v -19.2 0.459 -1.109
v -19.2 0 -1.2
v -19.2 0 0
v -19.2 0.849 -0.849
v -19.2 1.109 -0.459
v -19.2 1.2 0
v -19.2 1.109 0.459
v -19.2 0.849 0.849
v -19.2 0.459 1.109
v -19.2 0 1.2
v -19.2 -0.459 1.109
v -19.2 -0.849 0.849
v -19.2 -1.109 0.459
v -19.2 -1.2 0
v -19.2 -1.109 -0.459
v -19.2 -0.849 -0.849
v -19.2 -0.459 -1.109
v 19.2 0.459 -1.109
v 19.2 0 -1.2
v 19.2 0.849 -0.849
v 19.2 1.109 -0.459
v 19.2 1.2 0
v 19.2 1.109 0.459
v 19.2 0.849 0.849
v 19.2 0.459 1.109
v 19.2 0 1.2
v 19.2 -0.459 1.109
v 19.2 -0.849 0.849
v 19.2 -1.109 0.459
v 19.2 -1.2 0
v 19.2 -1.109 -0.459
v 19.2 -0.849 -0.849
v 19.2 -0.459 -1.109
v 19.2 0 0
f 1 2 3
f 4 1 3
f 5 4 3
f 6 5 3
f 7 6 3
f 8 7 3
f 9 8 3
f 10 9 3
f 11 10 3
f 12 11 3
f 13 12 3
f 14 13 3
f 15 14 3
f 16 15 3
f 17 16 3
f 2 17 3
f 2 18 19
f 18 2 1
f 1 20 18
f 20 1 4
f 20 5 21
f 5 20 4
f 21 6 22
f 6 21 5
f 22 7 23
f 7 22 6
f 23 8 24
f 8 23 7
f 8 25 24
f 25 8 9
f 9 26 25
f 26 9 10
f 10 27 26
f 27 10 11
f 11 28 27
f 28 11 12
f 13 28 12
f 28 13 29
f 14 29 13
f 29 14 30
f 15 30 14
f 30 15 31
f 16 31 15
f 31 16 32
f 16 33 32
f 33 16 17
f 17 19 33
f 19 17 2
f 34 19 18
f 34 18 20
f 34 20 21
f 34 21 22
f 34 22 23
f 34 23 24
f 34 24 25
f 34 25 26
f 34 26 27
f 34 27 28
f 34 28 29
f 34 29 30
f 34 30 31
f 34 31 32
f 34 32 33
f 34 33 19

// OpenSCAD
// file: ../p/stud3.scad
use <../lib.scad>
use <4-4cyli.scad>
use <4-4disc.scad>
use <4-4edge.scad>
$fa=1; $fs=0.2;
function ldraw_lib__stud3(realsolid=false) = realsolid ? 
    [openscad(translate([0,0,-eps()], o=cylinder(4+eps(), r=4)),2)] : [
// 0 Stud Tube Solid
// 0 Name: stud3.dat
// 0 Author: James Jessiman
// 0 !LDRAW_ORG Primitive UPDATE 2012-01
// 0 !LICENSE Licensed under CC BY 2.0 and CC BY 4.0 : see CAreadme.txt
// 
// 0 BFC CERTIFY CCW
  [0,"BFC","CERTIFY"],
  [0,"BFC","CCW"],
// 
// 0 !HISTORY 2002-04-04 [sbliss] Modified for BFC compliance
// 0 !HISTORY 2002-04-25 [PTadmin] Official Update 2002-02
// 0 !HISTORY 2007-06-24 [PTadmin] Header formatted for Contributor Agreement
// 0 !HISTORY 2008-07-01 [PTadmin] Official Update 2008-01
// 0 !HISTORY 2012-02-16 [Philo] Changed to CCW
// 0 !HISTORY 2012-03-30 [PTadmin] Official Update 2012-01
// 
// 
// 1 16 0 -4 0 4 0 0 0 1 0 0 0 4 4-4edge.dat
  [1,16,0,-4,0,4,0,0,0,1,0,0,0,4, ldraw_lib__4_4edge(realsolid)],
// 1 16 0 0 0 4 0 0 0 1 0 0 0 4 4-4edge.dat
  [1,16,0,0,0,4,0,0,0,1,0,0,0,4, ldraw_lib__4_4edge(realsolid)],
// 1 16 0 -4 0 4 0 0 0 1 0 0 0 4 4-4disc.dat
  [1,16,0,-4,0,4,0,0,0,1,0,0,0,4, ldraw_lib__4_4disc(realsolid)],
// 1 16 0 -4 0 4 0 0 0 4 0 0 0 4 4-4cyli.dat
  [1,16,0,-4,0,4,0,0,0,4,0,0,0,4, ldraw_lib__4_4cyli(realsolid)],
];
module ldraw_lib__stud3(step=0, col=false, unit=2/5, alt=false, line=0.2, solid=!$preview)
    makepoly(ldraw_lib__stud3(solid), step=step, col=col, unit=unit, alt=alt, line=line, solid=solid);
ldraw_lib__stud3(line=0.2);
// file: ../p/stud.scad
use <../lib.scad>
use <4-4cyli.scad>
use <4-4disc.scad>
use <4-4edge.scad>
$fa=1; $fs=0.2;
function ldraw_lib__stud(realsolid=false) = realsolid ? 
    [openscad(translate([0,0,-eps()], o=cylinder(4+eps(), r=6)),2)] : [
// 0 Stud
// 0 Name: stud.dat
// 0 Author: James Jessiman
// 0 !LDRAW_ORG Primitive UPDATE 2012-01
// 0 !LICENSE Licensed under CC BY 2.0 and CC BY 4.0 : see CAreadme.txt
// 
// 0 BFC CERTIFY CCW
  [0,"BFC","CERTIFY"],
  [0,"BFC","CCW"],
// 
// 0 !HISTORY 2002-04-04 [sbliss] Modified for BFC compliance
// 0 !HISTORY 2002-04-25 [PTadmin] Official Update 2002-02
// 0 !HISTORY 2007-06-24 [PTadmin] Header formatted for Contributor Agreement
// 0 !HISTORY 2008-07-01 [PTadmin] Official Update 2008-01
// 0 !HISTORY 2012-02-16 [Philo] Changed to CCW
// 0 !HISTORY 2012-03-30 [PTadmin] Official Update 2012-01
// 
// 
// 1 16 0 0 0 6 0 0 0 1 0 0 0 6 4-4edge.dat
  [1,16,0,0,0,6,0,0,0,1,0,0,0,6, ldraw_lib__4_4edge(realsolid)],
// 1 16 0 -4 0 6 0 0 0 1 0 0 0 6 4-4edge.dat
  [1,16,0,-4,0,6,0,0,0,1,0,0,0,6, ldraw_lib__4_4edge(realsolid)],
// 1 16 0 0 0 6 0 0 0 -4 0 0 0 6 4-4cyli.dat
  [1,16,0,0,0,6,0,0,0,-4,0,0,0,6, ldraw_lib__4_4cyli(realsolid)],
// 1 16 0 -4 0 6 0 0 0 1 0 0 0 6 4-4disc.dat
  [1,16,0,-4,0,6,0,0,0,1,0,0,0,6, ldraw_lib__4_4disc(realsolid)],
];
module ldraw_lib__stud(step=0, col=false, unit=2/5, alt=false, line=0.2, solid=!$preview)
    makepoly(ldraw_lib__stud(solid), step=step, col=col, unit=unit, alt=alt, line=line, solid=solid);
ldraw_lib__stud(line=0.2);
// file: ../p/box5.scad
use <../lib.scad>
$fa=1; $fs=0.2;
function ldraw_lib__box5(realsolid=false) = [
// 0 Box with 5 Faces and All Edges
// 0 Name: box5.dat
// 0 Author: James Jessiman
// 0 !LDRAW_ORG Primitive UPDATE 2012-01
// 0 !LICENSE Licensed under CC BY 2.0 and CC BY 4.0 : see CAreadme.txt
// 
// 0 BFC CERTIFY CCW
  [0,"BFC","CERTIFY"],
  [0,"BFC","CCW"],
// 
// 0 !HISTORY 2002-04-03 [sbliss] Modified for BFC compliance
// 0 !HISTORY 2002-04-25 [PTadmin] Official Update 2002-02
// 0 !HISTORY 2007-06-24 [PTadmin] Header formatted for Contributor Agreement
// 0 !HISTORY 2008-07-01 [PTadmin] Official Update 2008-01
// 0 !HISTORY 2012-02-16 [Philo] Changed to CCW
// 0 !HISTORY 2012-03-30 [PTadmin] Official Update 2012-01
// 
// 
// 2 24 1 1 1 -1 1 1
  [2,24,1,1,1,-1,1,1],
// 2 24 -1 1 1 -1 1 -1
  [2,24,-1,1,1,-1,1,-1],
// 2 24 -1 1 -1 1 1 -1
  [2,24,-1,1,-1,1,1,-1],
// 2 24 1 1 -1 1 1 1
  [2,24,1,1,-1,1,1,1],
// 2 24 1 0 1 -1 0 1
  [2,24,1,0,1,-1,0,1],
// 2 24 -1 0 1 -1 0 -1
  [2,24,-1,0,1,-1,0,-1],
// 2 24 -1 0 -1 1 0 -1
  [2,24,-1,0,-1,1,0,-1],
// 2 24 1 0 -1 1 0 1
  [2,24,1,0,-1,1,0,1],
// 2 24 1 0 1 1 1 1
  [2,24,1,0,1,1,1,1],
// 2 24 -1 0 1 -1 1 1
  [2,24,-1,0,1,-1,1,1],
// 2 24 1 0 -1 1 1 -1
  [2,24,1,0,-1,1,1,-1],
// 2 24 -1 0 -1 -1 1 -1
  [2,24,-1,0,-1,-1,1,-1],
// 4 16 -1 1 1 1 1 1 1 1 -1 -1 1 -1
  [4,16,-1,1,1,1,1,1,1,1,-1,-1,1,-1],
// 4 16 -1 1 1 -1 0 1 1 0 1 1 1 1
  [4,16,-1,1,1,-1,0,1,1,0,1,1,1,1],
// 4 16 -1 1 -1 -1 0 -1 -1 0 1 -1 1 1
  [4,16,-1,1,-1,-1,0,-1,-1,0,1,-1,1,1],
// 4 16 1 1 -1 1 0 -1 -1 0 -1 -1 1 -1
  [4,16,1,1,-1,1,0,-1,-1,0,-1,-1,1,-1],
// 4 16 1 1 1 1 0 1 1 0 -1 1 1 -1
  [4,16,1,1,1,1,0,1,1,0,-1,1,1,-1],
];
module ldraw_lib__box5(step=0, col=false, unit=2/5, alt=false, line=0.2, solid=!$preview)
    makepoly(ldraw_lib__box5(solid), step=step, col=col, unit=unit, alt=alt, line=line, solid=solid);
ldraw_lib__box5(line=0.2);
// file: ../p/box4t.scad
use <../lib.scad>
$fa=1; $fs=0.2;
function ldraw_lib__box4t(realsolid=false) = [
// 0 Box with 4 Adjacent Faces and All Edges
// 0 Name: box4t.dat
// 0 Author: Tore Eriksson [Tore_Eriksson]
// 0 !LDRAW_ORG Primitive UPDATE 2003-02
// 0 !LICENSE Licensed under CC BY 2.0 and CC BY 4.0 : see CAreadme.txt
// 
// 0 BFC CERTIFY CCW
  [0,"BFC","CERTIFY"],
  [0,"BFC","CCW"],
// 
// 0 !HISTORY 1997-09-29 [PTadmin] Official Update 1997-15
// 0 !HISTORY 2002-08-31 [izanette] Modified with WINDZ for BFC compliance
// 0 !HISTORY 2003-08-01 [PTadmin] Official Update 2003-02
// 0 !HISTORY 2007-06-24 [PTadmin] Header formatted for Contributor Agreement
// 0 !HISTORY 2008-07-01 [PTadmin] Official Update 2008-01
// 
// 
// 2 24 1 1 1 -1 1 1
  [2,24,1,1,1,-1,1,1],
// 2 24 -1 1 1 -1 1 -1
  [2,24,-1,1,1,-1,1,-1],
// 2 24 -1 1 -1 1 1 -1
  [2,24,-1,1,-1,1,1,-1],
// 2 24 1 1 -1 1 1 1
  [2,24,1,1,-1,1,1,1],
// 2 24 1 0 1 -1 0 1
  [2,24,1,0,1,-1,0,1],
// 2 24 -1 0 1 -1 0 -1
  [2,24,-1,0,1,-1,0,-1],
// 2 24 -1 0 -1 1 0 -1
  [2,24,-1,0,-1,1,0,-1],
// 2 24 1 0 -1 1 0 1
  [2,24,1,0,-1,1,0,1],
// 2 24 1 0 1 1 1 1
  [2,24,1,0,1,1,1,1],
// 2 24 -1 0 1 -1 1 1
  [2,24,-1,0,1,-1,1,1],
// 2 24 1 0 -1 1 1 -1
  [2,24,1,0,-1,1,1,-1],
// 2 24 -1 0 -1 -1 1 -1
  [2,24,-1,0,-1,-1,1,-1],
// 4 16 1 1 1 1 1 -1 -1 1 -1 -1 1 1
  [4,16,1,1,1,1,1,-1,-1,1,-1,-1,1,1],
// 4 16 1 1 1 -1 1 1 -1 0 1 1 0 1
  [4,16,1,1,1,-1,1,1,-1,0,1,1,0,1],
// 4 16 -1 1 1 -1 1 -1 -1 0 -1 -1 0 1
  [4,16,-1,1,1,-1,1,-1,-1,0,-1,-1,0,1],
// 0 4 16 -1 1 -1 -1 0 -1 1 0 -1 1 1 -1
// 4 16 1 1 -1 1 1 1 1 0 1 1 0 -1
  [4,16,1,1,-1,1,1,1,1,0,1,1,0,-1],
// 0
];
module ldraw_lib__box4t(step=0, col=false, unit=2/5, alt=false, line=0.2, solid=!$preview)
    makepoly(ldraw_lib__box4t(solid), step=step, col=col, unit=unit, alt=alt, line=line, solid=solid);
ldraw_lib__box4t(line=0.2);
// file: s/3004s01.scad
use <../../lib.scad>
use <../../p/box4t.scad>
use <../../p/box5.scad>
use <../../p/stud.scad>
use <../../p/stud3.scad>
$fa=1; $fs=0.2;
function ldraw_lib__s__3004s01(realsolid=false) = [
// 0 ~Brick  1 x  2 without Front Face
// 0 Name: s\3004s01.dat
// 0 Author: James Jessiman
// 0 !LDRAW_ORG Subpart UPDATE 2003-03
// 0 !LICENSE Licensed under CC BY 2.0 and CC BY 4.0 : see CAreadme.txt
// 
// 0 BFC CERTIFY CCW
  [0,"BFC","CERTIFY"],
  [0,"BFC","CCW"],
// 
// 0 !HISTORY 2003-09-07 [jriley] Subfiling, BFC
// 0 !HISTORY 2003-12-19 [PTadmin] Official Update 2003-03
// 0 !HISTORY 2007-08-29 [PTadmin] Header formatted for Contributor Agreement
// 0 !HISTORY 2008-07-01 [PTadmin] Official Update 2008-01
// 
// 
// 1 16 0 4 0 1 0 0 0 -5 0 0 0 1 stud3.dat
  [1,16,0,4,0,1,0,0,0,-5,0,0,0,1, ldraw_lib__stud3(realsolid)],
// 0 BFC INVERTNEXT
  [0,"BFC","INVERTNEXT"],
// 1 16 0 24 0 16 0 0 0 -20 0 0 0 6 box5.dat
  [1,16,0,24,0,16,0,0,0,-20,0,0,0,6, ldraw_lib__box5(realsolid)],
// 4 16 20 24 10 16 24 6 -16 24 6 -20 24 10
  [4,16,20,24,10,16,24,6,-16,24,6,-20,24,10],
// 4 16 -20 24 10 -16 24 6 -16 24 -6 -20 24 -10
  [4,16,-20,24,10,-16,24,6,-16,24,-6,-20,24,-10],
// 4 16 -20 24 -10 -16 24 -6 16 24 -6 20 24 -10
  [4,16,-20,24,-10,-16,24,-6,16,24,-6,20,24,-10],
// 4 16 20 24 -10 16 24 -6 16 24 6 20 24 10
  [4,16,20,24,-10,16,24,-6,16,24,6,20,24,10],
// 1 16 0 24 0 20 0 0 0 -24 0 0 0 10 box4t.dat
  [1,16,0,24,0,20,0,0,0,-24,0,0,0,10, ldraw_lib__box4t(realsolid)],
// 1 16 10 0 0 1 0 0 0 1 0 0 0 1 stud.dat
  [1,16,10,0,0,1,0,0,0,1,0,0,0,1, ldraw_lib__stud(realsolid)],
// 1 16 -10 0 0 1 0 0 0 1 0 0 0 1 stud.dat
  [1,16,-10,0,0,1,0,0,0,1,0,0,0,1, ldraw_lib__stud(realsolid)],
// 0
];
module ldraw_lib__s__3004s01(step=0, col=false, unit=2/5, alt=false, line=0.2, solid=!$preview)
    makepoly(ldraw_lib__s__3004s01(solid), step=step, col=col, unit=unit, alt=alt, line=line, solid=solid);
ldraw_lib__s__3004s01(line=0.2);
// file: ../p/4-4edge.scad
use <../lib.scad>
$fa=1; $fs=0.2;
function ldraw_lib__4_4edge(realsolid=false) = [
// 0 Circle 1.0
// 0 Name: 4-4edge.dat
// 0 Author: James Jessiman
// 0 !LDRAW_ORG Primitive UPDATE 2017-01
// 0 !LICENSE Licensed under CC BY 2.0 and CC BY 4.0 : see CAreadme.txt
// 
// 0 BFC CERTIFY CCW
  [0,"BFC","CERTIFY"],
  [0,"BFC","CCW"],
// 
// 0 !HISTORY 1998-12-15 [PTadmin] Official Update 1998-10
// 0 !HISTORY 2005-12-28 [PTadmin] Official Update 2005-01
// 0 !HISTORY 2007-06-24 [PTadmin] Header formatted for Contributor Agreement
// 0 !HISTORY 2008-07-01 [PTadmin] Official Update 2008-01
// 0 !HISTORY 2017-01-15 [Steffen] BFCed
// 0 !HISTORY 2017-12-30 [PTadmin] Official Update 2017-01
// 
// 
// 2 24 1 0 0 0.9239 0 0.3827
  [2,24,1,0,0,0.9239,0,0.3827],
// 2 24 0.9239 0 0.3827 0.7071 0 0.7071
  [2,24,0.9239,0,0.3827,0.7071,0,0.7071],
// 2 24 0.7071 0 0.7071 0.3827 0 0.9239
  [2,24,0.7071,0,0.7071,0.3827,0,0.9239],
// 2 24 0.3827 0 0.9239 0 0 1
  [2,24,0.3827,0,0.9239,0,0,1],
// 2 24 0 0 1 -0.3827 0 0.9239
  [2,24,0,0,1,-0.3827,0,0.9239],
// 2 24 -0.3827 0 0.9239 -0.7071 0 0.7071
  [2,24,-0.3827,0,0.9239,-0.7071,0,0.7071],
// 2 24 -0.7071 0 0.7071 -0.9239 0 0.3827
  [2,24,-0.7071,0,0.7071,-0.9239,0,0.3827],
// 2 24 -0.9239 0 0.3827 -1 0 -0
  [2,24,-0.9239,0,0.3827,-1,0,-0],
// 2 24 -1 0 -0 -0.9239 0 -0.3827
  [2,24,-1,0,-0,-0.9239,0,-0.3827],
// 2 24 -0.9239 0 -0.3827 -0.7071 0 -0.7071
  [2,24,-0.9239,0,-0.3827,-0.7071,0,-0.7071],
// 2 24 -0.7071 0 -0.7071 -0.3827 0 -0.9239
  [2,24,-0.7071,0,-0.7071,-0.3827,0,-0.9239],
// 2 24 -0.3827 0 -0.9239 0 0 -1
  [2,24,-0.3827,0,-0.9239,0,0,-1],
// 2 24 0 0 -1 0.3827 0 -0.9239
  [2,24,0,0,-1,0.3827,0,-0.9239],
// 2 24 0.3827 0 -0.9239 0.7071 0 -0.7071
  [2,24,0.3827,0,-0.9239,0.7071,0,-0.7071],
// 2 24 0.7071 0 -0.7071 0.9239 0 -0.3827
  [2,24,0.7071,0,-0.7071,0.9239,0,-0.3827],
// 2 24 0.9239 0 -0.3827 1 0 0
  [2,24,0.9239,0,-0.3827,1,0,0],
];
module ldraw_lib__4_4edge(step=0, col=false, unit=2/5, alt=false, line=0.2, solid=!$preview)
    makepoly(ldraw_lib__4_4edge(solid), step=step, col=col, unit=unit, alt=alt, line=line, solid=solid);
ldraw_lib__4_4edge(line=0.2);
// file: ../p/4-4cyli.scad
use <../lib.scad>
$fa=1; $fs=0.2;
function ldraw_lib__4_4cyli(realsolid=false) = [
// 0 Cylinder 1.0
// 0 Name: 4-4cyli.dat
// 0 Author: James Jessiman
// 0 !LDRAW_ORG Primitive UPDATE 2005-01
// 0 !LICENSE Licensed under CC BY 2.0 and CC BY 4.0 : see CAreadme.txt
// 
// 0 BFC CERTIFY CCW
  [0,"BFC","CERTIFY"],
  [0,"BFC","CCW"],
// 
// 0 !HISTORY 1998-12-15 [PTadmin] Official Update 1998-10
// 0 !HISTORY 2002-03-23 [sbliss] Added BFC statement; merged headers from files in distributions LDraw 0.27 and Complete.
// 0 !HISTORY 2002-04-25 [PTadmin] Official Update 2002-02
// 0 !HISTORY 2004-12-14 [guyvivan] BFC CCW
// 0 !HISTORY 2005-12-28 [PTadmin] Official Update 2005-01
// 0 !HISTORY 2007-06-24 [PTadmin] Header formatted for Contributor Agreement
// 0 !HISTORY 2008-07-01 [PTadmin] Official Update 2008-01
// 
// 
// 4 16 1 1 0 0.9239 1 0.3827 0.9239 0 0.3827 1 0 0
  [4,16,1,1,0,0.9239,1,0.3827,0.9239,0,0.3827,1,0,0],
// 5 24 1 0 0 1 1 0 0.9239 0 0.3827 0.9239 0 -0.3827
  [5,24,1,0,0,1,1,0,0.9239,0,0.3827,0.9239,0,-0.3827],
// 4 16 0.9239 1 0.3827 0.7071 1 0.7071 0.7071 0 0.7071 0.9239 0 0.3827
  [4,16,0.9239,1,0.3827,0.7071,1,0.7071,0.7071,0,0.7071,0.9239,0,0.3827],
// 5 24 0.9239 0 0.3827 0.9239 1 0.3827 0.7071 0 0.7071 1 0 0
  [5,24,0.9239,0,0.3827,0.9239,1,0.3827,0.7071,0,0.7071,1,0,0],
// 4 16 0.7071 1 0.7071 0.3827 1 0.9239 0.3827 0 0.9239 0.7071 0 0.7071
  [4,16,0.7071,1,0.7071,0.3827,1,0.9239,0.3827,0,0.9239,0.7071,0,0.7071],
// 5 24 0.7071 0 0.7071 0.7071 1 0.7071 0.3827 0 0.9239 0.9239 0 0.3827
  [5,24,0.7071,0,0.7071,0.7071,1,0.7071,0.3827,0,0.9239,0.9239,0,0.3827],
// 4 16 0.3827 1 0.9239 0 1 1 0 0 1 0.3827 0 0.9239
  [4,16,0.3827,1,0.9239,0,1,1,0,0,1,0.3827,0,0.9239],
// 5 24 0.3827 0 0.9239 0.3827 1 0.9239 0 0 1 0.7071 0 0.7071
  [5,24,0.3827,0,0.9239,0.3827,1,0.9239,0,0,1,0.7071,0,0.7071],
// 4 16 0 1 1 -0.3827 1 0.9239 -0.3827 0 0.9239 0 0 1
  [4,16,0,1,1,-0.3827,1,0.9239,-0.3827,0,0.9239,0,0,1],
// 5 24 0 0 1 0 1 1 -0.3827 0 0.9239 0.3827 0 0.9239
  [5,24,0,0,1,0,1,1,-0.3827,0,0.9239,0.3827,0,0.9239],
// 4 16 -0.3827 1 0.9239 -0.7071 1 0.7071 -0.7071 0 0.7071 -0.3827 0 0.9239
  [4,16,-0.3827,1,0.9239,-0.7071,1,0.7071,-0.7071,0,0.7071,-0.3827,0,0.9239],
// 5 24 -0.3827 0 0.9239 -0.3827 1 0.9239 -0.7071 0 0.7071 0 0 1
  [5,24,-0.3827,0,0.9239,-0.3827,1,0.9239,-0.7071,0,0.7071,0,0,1],
// 4 16 -0.7071 1 0.7071 -0.9239 1 0.3827 -0.9239 0 0.3827 -0.7071 0 0.7071
  [4,16,-0.7071,1,0.7071,-0.9239,1,0.3827,-0.9239,0,0.3827,-0.7071,0,0.7071],
// 5 24 -0.7071 0 0.7071 -0.7071 1 0.7071 -0.9239 0 0.3827 -0.3827 0 0.9239
  [5,24,-0.7071,0,0.7071,-0.7071,1,0.7071,-0.9239,0,0.3827,-0.3827,0,0.9239],
// 4 16 -0.9239 1 0.3827 -1 1 0 -1 0 0 -0.9239 0 0.3827
  [4,16,-0.9239,1,0.3827,-1,1,0,-1,0,0,-0.9239,0,0.3827],
// 5 24 -0.9239 0 0.3827 -0.9239 1 0.3827 -1 0 0 -0.7071 0 0.7071
  [5,24,-0.9239,0,0.3827,-0.9239,1,0.3827,-1,0,0,-0.7071,0,0.7071],
// 4 16 -1 1 0 -0.9239 1 -0.3827 -0.9239 0 -0.3827 -1 0 0
  [4,16,-1,1,0,-0.9239,1,-0.3827,-0.9239,0,-0.3827,-1,0,0],
// 5 24 -1 0 0 -1 1 0 -0.9239 0 -0.3827 -0.9239 0 0.3827
  [5,24,-1,0,0,-1,1,0,-0.9239,0,-0.3827,-0.9239,0,0.3827],
// 4 16 -0.9239 1 -0.3827 -0.7071 1 -0.7071 -0.7071 0 -0.7071 -0.9239 0 -0.3827
  [4,16,-0.9239,1,-0.3827,-0.7071,1,-0.7071,-0.7071,0,-0.7071,-0.9239,0,-0.3827],
// 5 24 -0.9239 0 -0.3827 -0.9239 1 -0.3827 -0.7071 0 -0.7071 -1 0 0
  [5,24,-0.9239,0,-0.3827,-0.9239,1,-0.3827,-0.7071,0,-0.7071,-1,0,0],
// 4 16 -0.7071 1 -0.7071 -0.3827 1 -0.9239 -0.3827 0 -0.9239 -0.7071 0 -0.7071
  [4,16,-0.7071,1,-0.7071,-0.3827,1,-0.9239,-0.3827,0,-0.9239,-0.7071,0,-0.7071],
// 5 24 -0.7071 0 -0.7071 -0.7071 1 -0.7071 -0.3827 0 -0.9239 -0.9239 0 -0.3827
  [5,24,-0.7071,0,-0.7071,-0.7071,1,-0.7071,-0.3827,0,-0.9239,-0.9239,0,-0.3827],
// 4 16 -0.3827 1 -0.9239 0 1 -1 0 0 -1 -0.3827 0 -0.9239
  [4,16,-0.3827,1,-0.9239,0,1,-1,0,0,-1,-0.3827,0,-0.9239],
// 5 24 -0.3827 0 -0.9239 -0.3827 1 -0.9239 0 0 -1 -0.7071 0 -0.7071
  [5,24,-0.3827,0,-0.9239,-0.3827,1,-0.9239,0,0,-1,-0.7071,0,-0.7071],
// 4 16 0 1 -1 0.3827 1 -0.9239 0.3827 0 -0.9239 0 0 -1
  [4,16,0,1,-1,0.3827,1,-0.9239,0.3827,0,-0.9239,0,0,-1],
// 5 24 0 0 -1 0 1 -1 0.3827 0 -0.9239 -0.3827 0 -0.9239
  [5,24,0,0,-1,0,1,-1,0.3827,0,-0.9239,-0.3827,0,-0.9239],
// 4 16 0.3827 1 -0.9239 0.7071 1 -0.7071 0.7071 0 -0.7071 0.3827 0 -0.9239
  [4,16,0.3827,1,-0.9239,0.7071,1,-0.7071,0.7071,0,-0.7071,0.3827,0,-0.9239],
// 5 24 0.3827 0 -0.9239 0.3827 1 -0.9239 0.7071 0 -0.7071 0 0 -1
  [5,24,0.3827,0,-0.9239,0.3827,1,-0.9239,0.7071,0,-0.7071,0,0,-1],
// 4 16 0.7071 1 -0.7071 0.9239 1 -0.3827 0.9239 0 -0.3827 0.7071 0 -0.7071
  [4,16,0.7071,1,-0.7071,0.9239,1,-0.3827,0.9239,0,-0.3827,0.7071,0,-0.7071],
// 5 24 0.7071 0 -0.7071 0.7071 1 -0.7071 0.9239 0 -0.3827 0.3827 0 -0.9239
  [5,24,0.7071,0,-0.7071,0.7071,1,-0.7071,0.9239,0,-0.3827,0.3827,0,-0.9239],
// 4 16 0.9239 1 -0.3827 1 1 0 1 0 0 0.9239 0 -0.3827
  [4,16,0.9239,1,-0.3827,1,1,0,1,0,0,0.9239,0,-0.3827],
// 5 24 0.9239 0 -0.3827 0.9239 1 -0.3827 1 0 0 0.7071 0 -0.7071
  [5,24,0.9239,0,-0.3827,0.9239,1,-0.3827,1,0,0,0.7071,0,-0.7071],
// 0
];
module ldraw_lib__4_4cyli(step=0, col=false, unit=2/5, alt=false, line=0.2, solid=!$preview)
    makepoly(ldraw_lib__4_4cyli(solid), step=step, col=col, unit=unit, alt=alt, line=line, solid=solid);
ldraw_lib__4_4cyli(line=0.2);
// file: 3004.scad
use <../lib.scad>
use <s/3004s01.scad>
$fa=1; $fs=0.2;
function ldraw_lib__3004(realsolid=false) = [
// 0 Brick  1 x  2
// 0 Name: 3004.dat
// 0 Author: James Jessiman
// 0 !LDRAW_ORG Part UPDATE 2022-05
// 0 !LICENSE Licensed under CC BY 2.0 and CC BY 4.0 : see CAreadme.txt
// 
// 0 BFC CERTIFY CCW
  [0,"BFC","CERTIFY"],
  [0,"BFC","CCW"],
// 
// 0 !HISTORY 2001-10-26 [PTadmin] Official Update 2001-01
// 0 !HISTORY 2002-05-07 {unknown} BFC Certification
// 0 !HISTORY 2002-06-11 [PTadmin] Official Update 2002-03
// 0 !HISTORY 2007-05-07 [PTadmin] Header formatted for Contributor Agreement
// 0 !HISTORY 2008-07-01 [PTadmin] Official Update 2008-01
// 0 !HISTORY 2022-08-04 [MagFors] Using subfile
// 0 !HISTORY 2022-09-15 [PTadmin] Official Update 2022-05
// 
// 
// 1 16 0 0 0 1 0 0 0 1 0 0 0 1 s\3004s01.dat
  [1,16,0,0,0,1,0,0,0,1,0,0,0,1, ldraw_lib__s__3004s01(realsolid)],
// 4 16 -20 24 -10 20 24 -10 20 0 -10 -20 0 -10
  [4,16,-20,24,-10,20,24,-10,20,0,-10,-20,0,-10],
];
module ldraw_lib__3004(step=0, col=false, unit=2/5, alt=false, line=0.2, solid=!$preview)
    makepoly(ldraw_lib__3004(solid), step=step, col=col, unit=unit, alt=alt, line=line, solid=solid);
ldraw_lib__3004(line=0.2);
// file: ../p/4-4disc.scad
use <../lib.scad>
$fa=1; $fs=0.2;
function ldraw_lib__4_4disc(realsolid=false) = [
// 0 Disc 1.0
// 0 Name: 4-4disc.dat
// 0 Author: James Jessiman
// 0 !LDRAW_ORG Primitive UPDATE 2002-02
// 0 !LICENSE Licensed under CC BY 2.0 and CC BY 4.0 : see CAreadme.txt
// 
// 0 BFC CERTIFY CCW
  [0,"BFC","CERTIFY"],
  [0,"BFC","CCW"],
// 
// 0 !HISTORY 1998-12-15 [PTadmin] Official Update 1998-10
// 0 !HISTORY 2002-03-23 [sbliss] Added BFC statement
// 0 !HISTORY 2002-04-25 [PTadmin] Official Update 2002-02
// 0 !HISTORY 2007-06-24 [PTadmin] Header formatted for Contributor Agreement
// 0 !HISTORY 2008-07-01 [PTadmin] Official Update 2008-01
// 
// 
// 3 16 0 0 0 1 0 0 0.9239 0 0.3827
  [3,16,0,0,0,1,0,0,0.9239,0,0.3827],
// 3 16 0 0 0 0.9239 0 0.3827 0.7071 0 0.7071
  [3,16,0,0,0,0.9239,0,0.3827,0.7071,0,0.7071],
// 3 16 0 0 0 0.7071 0 0.7071 0.3827 0 0.9239
  [3,16,0,0,0,0.7071,0,0.7071,0.3827,0,0.9239],
// 3 16 0 0 0 0.3827 0 0.9239 0 0 1
  [3,16,0,0,0,0.3827,0,0.9239,0,0,1],
// 3 16 0 0 0 0 0 1 -0.3827 0 0.9239
  [3,16,0,0,0,0,0,1,-0.3827,0,0.9239],
// 3 16 0 0 0 -0.3827 0 0.9239 -0.7071 0 0.7071
  [3,16,0,0,0,-0.3827,0,0.9239,-0.7071,0,0.7071],
// 3 16 0 0 0 -0.7071 0 0.7071 -0.9239 0 0.3827
  [3,16,0,0,0,-0.7071,0,0.7071,-0.9239,0,0.3827],
// 3 16 0 0 0 -0.9239 0 0.3827 -1 0 -0
  [3,16,0,0,0,-0.9239,0,0.3827,-1,0,-0],
// 3 16 0 0 0 -1 0 -0 -0.9239 0 -0.3827
  [3,16,0,0,0,-1,0,-0,-0.9239,0,-0.3827],
// 3 16 0 0 0 -0.9239 0 -0.3827 -0.7071 0 -0.7071
  [3,16,0,0,0,-0.9239,0,-0.3827,-0.7071,0,-0.7071],
// 3 16 0 0 0 -0.7071 0 -0.7071 -0.3827 0 -0.9239
  [3,16,0,0,0,-0.7071,0,-0.7071,-0.3827,0,-0.9239],
// 3 16 0 0 0 -0.3827 0 -0.9239 0 0 -1
  [3,16,0,0,0,-0.3827,0,-0.9239,0,0,-1],
// 3 16 0 0 0 0 0 -1 0.3827 0 -0.9239
  [3,16,0,0,0,0,0,-1,0.3827,0,-0.9239],
// 3 16 0 0 0 0.3827 0 -0.9239 0.7071 0 -0.7071
  [3,16,0,0,0,0.3827,0,-0.9239,0.7071,0,-0.7071],
// 3 16 0 0 0 0.7071 0 -0.7071 0.9239 0 -0.3827
  [3,16,0,0,0,0.7071,0,-0.7071,0.9239,0,-0.3827],
// 3 16 0 0 0 0.9239 0 -0.3827 1 0 0
  [3,16,0,0,0,0.9239,0,-0.3827,1,0,0],
// 0
];
module ldraw_lib__4_4disc(step=0, col=false, unit=2/5, alt=false, line=0.2, solid=!$preview)
    makepoly(ldraw_lib__4_4disc(solid), step=step, col=col, unit=unit, alt=alt, line=line, solid=solid);
ldraw_lib__4_4disc(line=0.2);
// file: ../p/4-4cylc.scad
use <../lib.scad>
use <4-4cyli.scad>
use <4-4disc.scad>
use <4-4edge.scad>
$fa=1; $fs=0.2;
function ldraw_lib__4_4cylc(realsolid=false) = [
// 0 Cylinder Closed 1.0
// 0 Name: 4-4cylc.dat
// 0 Author: Alex Taylor [anathema]
// 0 !LDRAW_ORG Primitive UPDATE 2009-02
// 0 !LICENSE Licensed under CC BY 2.0 and CC BY 4.0 : see CAreadme.txt
// 
// 0 BFC CERTIFY CCW
  [0,"BFC","CERTIFY"],
  [0,"BFC","CCW"],
// 
// 0 !HISTORY 2008-12-29 [cwdee] Removed one disc
// 0 !HISTORY 2009-09-03 [PTadmin] Official Update 2009-02
// 
// 
// 1 16 0 0 0 1 0 0 0 1 0 0 0 1 4-4edge.dat
  [1,16,0,0,0,1,0,0,0,1,0,0,0,1, ldraw_lib__4_4edge(realsolid)],
// 1 16 0 1 0 1 0 0 0 1 0 0 0 1 4-4edge.dat
  [1,16,0,1,0,1,0,0,0,1,0,0,0,1, ldraw_lib__4_4edge(realsolid)],
// 1 16 0 0 0 1 0 0 0 1 0 0 0 1 4-4disc.dat
  [1,16,0,0,0,1,0,0,0,1,0,0,0,1, ldraw_lib__4_4disc(realsolid)],
// 1 16 0 0 0 1 0 0 0 1 0 0 0 1 4-4cyli.dat
  [1,16,0,0,0,1,0,0,0,1,0,0,0,1, ldraw_lib__4_4cyli(realsolid)],
// 0
];
module ldraw_lib__4_4cylc(step=0, col=false, unit=2/5, alt=false, line=0.2, solid=!$preview)
    makepoly(ldraw_lib__4_4cylc(solid), step=step, col=col, unit=unit, alt=alt, line=line, solid=solid);
ldraw_lib__4_4cylc(line=0.2);
// main file
use <../lib.scad>
use <../p/4-4cylc.scad>
use <../p/4-4disc.scad>
$fa=1; $fs=0.2;
function ldraw_lib__944(realsolid=false) = [
// 0 ~Axle Steel  6 x 96 LDU
// 0 Name: 944.dat
// 0 Author: Alex Taylor [anathema]
// 0 !LDRAW_ORG Part UPDATE 2011-02
// 0 !LICENSE Licensed under CC BY 2.0 and CC BY 4.0 : see CAreadme.txt
// 
// 0 BFC CERTIFY CCW
  [0,"BFC","CERTIFY"],
  [0,"BFC","CCW"],
// 
// 0 !CATEGORY Wheel
// 
// 0 !HISTORY 2011-12-29 [PTadmin] Official Update 2011-02
// 
// 
// 1 16 -48 0 0 0 96 0 3 0 0 0 0 3 4-4cylc.dat
  [1,16,-48,0,0,0,96,0,3,0,0,0,0,3, ldraw_lib__4_4cylc(realsolid)],
// 1 16 48 0 0 0 -1 0 3 0 0 0 0 3 4-4disc.dat
  [1,16,48,0,0,0,-1,0,3,0,0,0,0,3, ldraw_lib__4_4disc(realsolid)],
// 0
];
module ldraw_lib__944(step=0, col=false, unit=2/5, alt=false, line=0.2, solid=!$preview)
    makepoly(ldraw_lib__944(solid), step=step, col=col, unit=unit, alt=alt, line=line, solid=solid);
ldraw_lib__944(line=0.2);
